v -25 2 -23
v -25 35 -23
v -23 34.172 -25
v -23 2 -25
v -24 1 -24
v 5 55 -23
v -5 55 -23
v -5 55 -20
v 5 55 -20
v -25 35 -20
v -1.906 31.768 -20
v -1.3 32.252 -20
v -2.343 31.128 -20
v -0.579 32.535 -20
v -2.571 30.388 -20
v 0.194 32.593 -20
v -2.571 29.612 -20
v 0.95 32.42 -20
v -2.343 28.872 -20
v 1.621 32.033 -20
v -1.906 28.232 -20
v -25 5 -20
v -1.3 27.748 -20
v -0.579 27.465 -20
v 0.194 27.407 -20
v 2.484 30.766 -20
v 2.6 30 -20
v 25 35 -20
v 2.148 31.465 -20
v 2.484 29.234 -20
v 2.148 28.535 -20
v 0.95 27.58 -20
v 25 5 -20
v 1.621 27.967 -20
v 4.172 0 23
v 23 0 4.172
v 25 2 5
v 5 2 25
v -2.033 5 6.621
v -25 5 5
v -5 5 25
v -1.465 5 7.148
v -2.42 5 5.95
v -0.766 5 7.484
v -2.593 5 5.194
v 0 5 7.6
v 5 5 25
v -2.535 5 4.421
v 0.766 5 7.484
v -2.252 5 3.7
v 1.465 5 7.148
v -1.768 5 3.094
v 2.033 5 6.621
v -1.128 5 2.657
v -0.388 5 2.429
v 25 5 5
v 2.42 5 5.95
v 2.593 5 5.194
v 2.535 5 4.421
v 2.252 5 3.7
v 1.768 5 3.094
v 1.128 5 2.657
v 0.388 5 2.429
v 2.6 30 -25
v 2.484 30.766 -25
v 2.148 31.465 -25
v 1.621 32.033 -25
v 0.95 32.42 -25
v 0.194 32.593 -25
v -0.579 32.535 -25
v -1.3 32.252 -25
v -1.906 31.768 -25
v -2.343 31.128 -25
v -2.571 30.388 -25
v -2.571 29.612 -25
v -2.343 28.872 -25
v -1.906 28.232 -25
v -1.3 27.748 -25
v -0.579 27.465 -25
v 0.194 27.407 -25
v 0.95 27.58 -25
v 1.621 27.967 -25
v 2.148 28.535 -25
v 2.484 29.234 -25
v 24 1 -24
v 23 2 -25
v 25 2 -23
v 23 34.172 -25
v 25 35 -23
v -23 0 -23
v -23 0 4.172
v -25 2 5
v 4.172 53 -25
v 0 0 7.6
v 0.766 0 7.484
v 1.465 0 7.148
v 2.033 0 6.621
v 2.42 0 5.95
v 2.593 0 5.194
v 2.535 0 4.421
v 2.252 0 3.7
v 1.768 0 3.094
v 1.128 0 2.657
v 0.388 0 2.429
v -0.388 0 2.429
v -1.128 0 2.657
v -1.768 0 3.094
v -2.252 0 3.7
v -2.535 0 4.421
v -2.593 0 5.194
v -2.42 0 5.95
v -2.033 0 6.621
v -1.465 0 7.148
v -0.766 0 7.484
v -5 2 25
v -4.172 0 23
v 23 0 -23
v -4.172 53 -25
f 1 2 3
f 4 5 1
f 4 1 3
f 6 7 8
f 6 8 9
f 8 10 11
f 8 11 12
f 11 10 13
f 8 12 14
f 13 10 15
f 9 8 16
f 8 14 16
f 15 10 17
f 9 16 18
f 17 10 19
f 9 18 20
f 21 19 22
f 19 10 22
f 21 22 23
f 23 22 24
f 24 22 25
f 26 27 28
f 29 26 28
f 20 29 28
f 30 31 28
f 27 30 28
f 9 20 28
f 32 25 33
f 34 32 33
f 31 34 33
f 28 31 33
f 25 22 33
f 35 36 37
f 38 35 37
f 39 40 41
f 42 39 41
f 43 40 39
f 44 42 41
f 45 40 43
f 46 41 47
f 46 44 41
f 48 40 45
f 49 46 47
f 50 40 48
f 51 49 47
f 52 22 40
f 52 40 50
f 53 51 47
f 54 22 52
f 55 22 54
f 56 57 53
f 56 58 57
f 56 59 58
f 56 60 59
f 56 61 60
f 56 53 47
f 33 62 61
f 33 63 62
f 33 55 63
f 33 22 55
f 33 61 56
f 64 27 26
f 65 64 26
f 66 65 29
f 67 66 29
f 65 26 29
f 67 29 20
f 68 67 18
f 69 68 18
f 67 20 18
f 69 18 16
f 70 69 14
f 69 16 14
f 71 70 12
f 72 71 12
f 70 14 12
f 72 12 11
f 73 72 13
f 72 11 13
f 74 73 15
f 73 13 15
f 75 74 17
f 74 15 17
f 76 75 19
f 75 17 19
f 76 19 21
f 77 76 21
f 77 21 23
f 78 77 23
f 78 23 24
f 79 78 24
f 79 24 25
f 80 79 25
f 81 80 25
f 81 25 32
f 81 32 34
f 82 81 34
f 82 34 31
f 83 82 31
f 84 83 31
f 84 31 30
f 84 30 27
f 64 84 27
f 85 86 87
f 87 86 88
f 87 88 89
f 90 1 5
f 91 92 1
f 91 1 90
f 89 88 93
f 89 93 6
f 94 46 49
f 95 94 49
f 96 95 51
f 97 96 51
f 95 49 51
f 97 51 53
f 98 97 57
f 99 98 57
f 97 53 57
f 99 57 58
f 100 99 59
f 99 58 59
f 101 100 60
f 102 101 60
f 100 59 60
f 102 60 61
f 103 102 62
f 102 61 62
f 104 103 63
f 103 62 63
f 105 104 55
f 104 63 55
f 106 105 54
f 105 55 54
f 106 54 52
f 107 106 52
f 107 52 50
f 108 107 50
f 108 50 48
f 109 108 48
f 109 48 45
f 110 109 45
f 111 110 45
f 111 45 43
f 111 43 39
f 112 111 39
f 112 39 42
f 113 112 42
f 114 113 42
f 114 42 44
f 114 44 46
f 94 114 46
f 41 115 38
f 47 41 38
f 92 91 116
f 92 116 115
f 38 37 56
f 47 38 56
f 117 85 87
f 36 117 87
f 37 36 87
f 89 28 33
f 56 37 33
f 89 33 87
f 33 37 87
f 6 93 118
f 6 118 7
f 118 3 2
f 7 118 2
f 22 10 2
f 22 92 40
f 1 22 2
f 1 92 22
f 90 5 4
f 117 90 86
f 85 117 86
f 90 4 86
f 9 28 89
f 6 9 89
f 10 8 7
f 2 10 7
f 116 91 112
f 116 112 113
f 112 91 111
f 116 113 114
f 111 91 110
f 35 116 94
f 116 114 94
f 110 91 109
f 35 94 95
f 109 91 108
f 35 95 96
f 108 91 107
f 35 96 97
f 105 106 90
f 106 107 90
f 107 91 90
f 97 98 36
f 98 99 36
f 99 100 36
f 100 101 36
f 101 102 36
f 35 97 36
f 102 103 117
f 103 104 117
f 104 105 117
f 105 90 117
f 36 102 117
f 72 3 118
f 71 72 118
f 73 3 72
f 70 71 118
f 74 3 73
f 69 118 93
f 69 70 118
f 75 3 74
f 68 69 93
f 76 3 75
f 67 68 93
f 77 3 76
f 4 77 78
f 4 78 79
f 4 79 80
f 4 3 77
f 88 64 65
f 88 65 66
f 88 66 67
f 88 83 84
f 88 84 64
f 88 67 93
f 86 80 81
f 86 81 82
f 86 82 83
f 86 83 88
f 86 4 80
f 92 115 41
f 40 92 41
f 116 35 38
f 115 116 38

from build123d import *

# Parameters (mm, degrees)
SKETCH1_W           = 50
SKETCH1_H           = 50
BOSS_EXTRUDE1_DEPTH = 5
SKETCH2_W           = 50
SKETCH2_H           = 5
BOSS_EXTRUDE2_DEPTH = 50
SKETCH3_R           = 2.6
CUT_EXTRUDE1_DEPTH  = 50
CHAMFER1_SIZE       = 20
SKETCH4_R           = 2.6
CUT_EXTRUDE2_DEPTH  = 50
CHAMFER2_SIZE       = 20
CHAMFER3_SIZE       = 2
CHAMFER4_SIZE       = 2


with BuildPart() as part:
    # Sketch1 → Boss-Extrude1 (new body)
    with BuildSketch(Plane(origin=(0, 0, 0), x_dir=(1, 0, 0), z_dir=(0, 1, 0))):
        Rectangle(SKETCH1_W, SKETCH1_H)
    extrude(amount=BOSS_EXTRUDE1_DEPTH)

    # Sketch2 → Boss-Extrude2 (add)
    with BuildSketch(Plane(origin=(0, 5, 0), x_dir=(1, 0, 0), z_dir=(0, 1, 0))):
        with Locations((0, 22.5)):
            Rectangle(SKETCH2_W, SKETCH2_H)
    extrude(amount=BOSS_EXTRUDE2_DEPTH)

    # Sketch3 → Cut-Extrude1 (cut)
    with BuildSketch(Plane.XY.offset(-20)):
        with Locations((0, 30)):
            Circle(SKETCH3_R)
    extrude(amount=-CUT_EXTRUDE1_DEPTH, mode=Mode.SUBTRACT)

    # Chamfer1
    chamfer1_edges = [part.edges().sort_by_distance(p)[0] for p in [
        (25, 55, -22.5),
        (-25, 55, -22.5),
    ]]
    chamfer(chamfer1_edges, length=CHAMFER1_SIZE)

    # Sketch4 → Cut-Extrude2 (cut)
    with BuildSketch(Plane(origin=(0, 5, 0), x_dir=(1, 0, 0), z_dir=(0, 1, 0))):
        with Locations(Location((0, -5, 0), (0, 0, 270))):
            Circle(SKETCH4_R)
    extrude(amount=-CUT_EXTRUDE2_DEPTH, mode=Mode.SUBTRACT)

    # Chamfer2
    chamfer2_edges = [part.edges().sort_by_distance(p)[0] for p in [
        (25, 2.5, 25),
        (-25, 2.5, 25),
    ]]
    chamfer(chamfer2_edges, length=CHAMFER2_SIZE)

    # Chamfer3
    chamfer3_edges = [part.edges().sort_by_distance(p)[0] for p in [
        (0, 0, -25),
    ]]
    chamfer(chamfer3_edges, length=CHAMFER3_SIZE)

    # Chamfer4
    # the kernel refuses this chamfer: 2 mm, written as the material it takes off along each edge
    with BuildSketch(Plane(origin=(25, 0, -28.143365976), x_dir=(-0.9996219169112968, -0.02749587661058639, 0), z_dir=(0, 0, 1))) as chamfer4_piece_1:
        Polygon((CHAMFER4_SIZE * 0.999621916911, -CHAMFER4_SIZE * 0.0274958766106), (-CHAMFER4_SIZE * 0.0274958766106, -CHAMFER4_SIZE * 0.999621916911), (0, 0), align=None)
    extrude(amount=38.286731952, mode=Mode.SUBTRACT)
    with BuildSketch(Plane(origin=(28.63690896, 0, 1.36309104), x_dir=(-0.7068394360706735, -0.027495876610586382, -0.7068394360706735), z_dir=(-0.7071067811865475, 0, 0.7071067811865476)), Plane(origin=(1.36309104, 58.63690896, -25), x_dir=(-0.7068394360706736, -0.7068394360706737, -0.027495876610585657), z_dir=(0.7071067811865476, -0.7071067811865476, 0)), Plane(origin=(-28.63690896, 31.36309104, -25), x_dir=(0.7068394360706735, -0.7068394360706735, -0.02749587661058563), z_dir=(0.7071067811865476, 0.7071067811865476, 0))) as chamfer4_piece_2:
        Polygon((CHAMFER4_SIZE * 0.999621916911, -CHAMFER4_SIZE * 0.0274958766106), (-CHAMFER4_SIZE * 0.0274958766106, -CHAMFER4_SIZE * 0.999621916911), (0, 0), align=None)
    extrude(amount=38.571003199, mode=Mode.SUBTRACT)
    with BuildSketch(Plane(origin=(10.143365976, 0, 25), x_dir=(0, -0.02749587661058639, -0.9996219169112968), z_dir=(-1, 0, 0))) as chamfer4_piece_3:
        Polygon((CHAMFER4_SIZE * 0.999621916911, -CHAMFER4_SIZE * 0.0274958766106), (-CHAMFER4_SIZE * 0.0274958766106, -CHAMFER4_SIZE * 0.999621916911), (0, 0), align=None)
    extrude(amount=20.286731952, mode=Mode.SUBTRACT)
    with BuildSketch(Plane(origin=(-28.63690896, 0, 1.36309104), x_dir=(0.7068394360706733, -0.027495876610586358, -0.7068394360706735), z_dir=(0.7071067811865476, 0, 0.7071067811865475))) as chamfer4_piece_4:
        Polygon((CHAMFER4_SIZE * 0.999621916911, CHAMFER4_SIZE * 0.0274958766106), (-CHAMFER4_SIZE * 0.0274958766106, CHAMFER4_SIZE * 0.999621916911), (0, 0), align=None)
    extrude(amount=38.571003199, mode=Mode.SUBTRACT)
    with BuildSketch(Plane(origin=(-25, 0, 10.143365976), x_dir=(-0.02749587661058563, 0.9996219169112968, 0), z_dir=(0, 0, -1))) as chamfer4_piece_5:
        Polygon((CHAMFER4_SIZE * 0.999621916911, CHAMFER4_SIZE * 0.0274958766106), (-CHAMFER4_SIZE * 0.0274958766106, CHAMFER4_SIZE * 0.999621916911), (0, 0), align=None)
    extrude(amount=38.286731952, mode=Mode.SUBTRACT)
    with BuildSketch(Plane(origin=(25, 40.143365976, -25), x_dir=(-0.9996219169112968, 0, -0.027495876610585647), z_dir=(0, -1, 0))) as chamfer4_piece_6:
        Polygon((CHAMFER4_SIZE * 0.999621916911, -CHAMFER4_SIZE * 0.0274958766106), (-CHAMFER4_SIZE * 0.0274958766106, -CHAMFER4_SIZE * 0.999621916911), (0, 0), align=None)
    extrude(amount=43.286731952, mode=Mode.SUBTRACT)
    with BuildSketch(Plane(origin=(10.143365976, 55, -25), x_dir=(0, -0.9996219169112968, -0.027495876610585647), z_dir=(-1, 0, 0))) as chamfer4_piece_7:
        Polygon((CHAMFER4_SIZE * 0.999621916911, CHAMFER4_SIZE * 0.0274958766106), (-CHAMFER4_SIZE * 0.0274958766106, CHAMFER4_SIZE * 0.999621916911), (0, 0), align=None)
    extrude(amount=20.286731952, mode=Mode.SUBTRACT)
    with BuildSketch(Plane(origin=(-25, -3.143365976, -25), x_dir=(-0.027495876610585647, 0, 0.9996219169112968), z_dir=(0, 1, 0))) as chamfer4_piece_8:
        Polygon((CHAMFER4_SIZE * 0.999621916911, CHAMFER4_SIZE * 0.0274958766106), (-CHAMFER4_SIZE * 0.0274958766106, CHAMFER4_SIZE * 0.999621916911), (0, 0), align=None)
    extrude(amount=43.286731952, mode=Mode.SUBTRACT)


solid = part.part
